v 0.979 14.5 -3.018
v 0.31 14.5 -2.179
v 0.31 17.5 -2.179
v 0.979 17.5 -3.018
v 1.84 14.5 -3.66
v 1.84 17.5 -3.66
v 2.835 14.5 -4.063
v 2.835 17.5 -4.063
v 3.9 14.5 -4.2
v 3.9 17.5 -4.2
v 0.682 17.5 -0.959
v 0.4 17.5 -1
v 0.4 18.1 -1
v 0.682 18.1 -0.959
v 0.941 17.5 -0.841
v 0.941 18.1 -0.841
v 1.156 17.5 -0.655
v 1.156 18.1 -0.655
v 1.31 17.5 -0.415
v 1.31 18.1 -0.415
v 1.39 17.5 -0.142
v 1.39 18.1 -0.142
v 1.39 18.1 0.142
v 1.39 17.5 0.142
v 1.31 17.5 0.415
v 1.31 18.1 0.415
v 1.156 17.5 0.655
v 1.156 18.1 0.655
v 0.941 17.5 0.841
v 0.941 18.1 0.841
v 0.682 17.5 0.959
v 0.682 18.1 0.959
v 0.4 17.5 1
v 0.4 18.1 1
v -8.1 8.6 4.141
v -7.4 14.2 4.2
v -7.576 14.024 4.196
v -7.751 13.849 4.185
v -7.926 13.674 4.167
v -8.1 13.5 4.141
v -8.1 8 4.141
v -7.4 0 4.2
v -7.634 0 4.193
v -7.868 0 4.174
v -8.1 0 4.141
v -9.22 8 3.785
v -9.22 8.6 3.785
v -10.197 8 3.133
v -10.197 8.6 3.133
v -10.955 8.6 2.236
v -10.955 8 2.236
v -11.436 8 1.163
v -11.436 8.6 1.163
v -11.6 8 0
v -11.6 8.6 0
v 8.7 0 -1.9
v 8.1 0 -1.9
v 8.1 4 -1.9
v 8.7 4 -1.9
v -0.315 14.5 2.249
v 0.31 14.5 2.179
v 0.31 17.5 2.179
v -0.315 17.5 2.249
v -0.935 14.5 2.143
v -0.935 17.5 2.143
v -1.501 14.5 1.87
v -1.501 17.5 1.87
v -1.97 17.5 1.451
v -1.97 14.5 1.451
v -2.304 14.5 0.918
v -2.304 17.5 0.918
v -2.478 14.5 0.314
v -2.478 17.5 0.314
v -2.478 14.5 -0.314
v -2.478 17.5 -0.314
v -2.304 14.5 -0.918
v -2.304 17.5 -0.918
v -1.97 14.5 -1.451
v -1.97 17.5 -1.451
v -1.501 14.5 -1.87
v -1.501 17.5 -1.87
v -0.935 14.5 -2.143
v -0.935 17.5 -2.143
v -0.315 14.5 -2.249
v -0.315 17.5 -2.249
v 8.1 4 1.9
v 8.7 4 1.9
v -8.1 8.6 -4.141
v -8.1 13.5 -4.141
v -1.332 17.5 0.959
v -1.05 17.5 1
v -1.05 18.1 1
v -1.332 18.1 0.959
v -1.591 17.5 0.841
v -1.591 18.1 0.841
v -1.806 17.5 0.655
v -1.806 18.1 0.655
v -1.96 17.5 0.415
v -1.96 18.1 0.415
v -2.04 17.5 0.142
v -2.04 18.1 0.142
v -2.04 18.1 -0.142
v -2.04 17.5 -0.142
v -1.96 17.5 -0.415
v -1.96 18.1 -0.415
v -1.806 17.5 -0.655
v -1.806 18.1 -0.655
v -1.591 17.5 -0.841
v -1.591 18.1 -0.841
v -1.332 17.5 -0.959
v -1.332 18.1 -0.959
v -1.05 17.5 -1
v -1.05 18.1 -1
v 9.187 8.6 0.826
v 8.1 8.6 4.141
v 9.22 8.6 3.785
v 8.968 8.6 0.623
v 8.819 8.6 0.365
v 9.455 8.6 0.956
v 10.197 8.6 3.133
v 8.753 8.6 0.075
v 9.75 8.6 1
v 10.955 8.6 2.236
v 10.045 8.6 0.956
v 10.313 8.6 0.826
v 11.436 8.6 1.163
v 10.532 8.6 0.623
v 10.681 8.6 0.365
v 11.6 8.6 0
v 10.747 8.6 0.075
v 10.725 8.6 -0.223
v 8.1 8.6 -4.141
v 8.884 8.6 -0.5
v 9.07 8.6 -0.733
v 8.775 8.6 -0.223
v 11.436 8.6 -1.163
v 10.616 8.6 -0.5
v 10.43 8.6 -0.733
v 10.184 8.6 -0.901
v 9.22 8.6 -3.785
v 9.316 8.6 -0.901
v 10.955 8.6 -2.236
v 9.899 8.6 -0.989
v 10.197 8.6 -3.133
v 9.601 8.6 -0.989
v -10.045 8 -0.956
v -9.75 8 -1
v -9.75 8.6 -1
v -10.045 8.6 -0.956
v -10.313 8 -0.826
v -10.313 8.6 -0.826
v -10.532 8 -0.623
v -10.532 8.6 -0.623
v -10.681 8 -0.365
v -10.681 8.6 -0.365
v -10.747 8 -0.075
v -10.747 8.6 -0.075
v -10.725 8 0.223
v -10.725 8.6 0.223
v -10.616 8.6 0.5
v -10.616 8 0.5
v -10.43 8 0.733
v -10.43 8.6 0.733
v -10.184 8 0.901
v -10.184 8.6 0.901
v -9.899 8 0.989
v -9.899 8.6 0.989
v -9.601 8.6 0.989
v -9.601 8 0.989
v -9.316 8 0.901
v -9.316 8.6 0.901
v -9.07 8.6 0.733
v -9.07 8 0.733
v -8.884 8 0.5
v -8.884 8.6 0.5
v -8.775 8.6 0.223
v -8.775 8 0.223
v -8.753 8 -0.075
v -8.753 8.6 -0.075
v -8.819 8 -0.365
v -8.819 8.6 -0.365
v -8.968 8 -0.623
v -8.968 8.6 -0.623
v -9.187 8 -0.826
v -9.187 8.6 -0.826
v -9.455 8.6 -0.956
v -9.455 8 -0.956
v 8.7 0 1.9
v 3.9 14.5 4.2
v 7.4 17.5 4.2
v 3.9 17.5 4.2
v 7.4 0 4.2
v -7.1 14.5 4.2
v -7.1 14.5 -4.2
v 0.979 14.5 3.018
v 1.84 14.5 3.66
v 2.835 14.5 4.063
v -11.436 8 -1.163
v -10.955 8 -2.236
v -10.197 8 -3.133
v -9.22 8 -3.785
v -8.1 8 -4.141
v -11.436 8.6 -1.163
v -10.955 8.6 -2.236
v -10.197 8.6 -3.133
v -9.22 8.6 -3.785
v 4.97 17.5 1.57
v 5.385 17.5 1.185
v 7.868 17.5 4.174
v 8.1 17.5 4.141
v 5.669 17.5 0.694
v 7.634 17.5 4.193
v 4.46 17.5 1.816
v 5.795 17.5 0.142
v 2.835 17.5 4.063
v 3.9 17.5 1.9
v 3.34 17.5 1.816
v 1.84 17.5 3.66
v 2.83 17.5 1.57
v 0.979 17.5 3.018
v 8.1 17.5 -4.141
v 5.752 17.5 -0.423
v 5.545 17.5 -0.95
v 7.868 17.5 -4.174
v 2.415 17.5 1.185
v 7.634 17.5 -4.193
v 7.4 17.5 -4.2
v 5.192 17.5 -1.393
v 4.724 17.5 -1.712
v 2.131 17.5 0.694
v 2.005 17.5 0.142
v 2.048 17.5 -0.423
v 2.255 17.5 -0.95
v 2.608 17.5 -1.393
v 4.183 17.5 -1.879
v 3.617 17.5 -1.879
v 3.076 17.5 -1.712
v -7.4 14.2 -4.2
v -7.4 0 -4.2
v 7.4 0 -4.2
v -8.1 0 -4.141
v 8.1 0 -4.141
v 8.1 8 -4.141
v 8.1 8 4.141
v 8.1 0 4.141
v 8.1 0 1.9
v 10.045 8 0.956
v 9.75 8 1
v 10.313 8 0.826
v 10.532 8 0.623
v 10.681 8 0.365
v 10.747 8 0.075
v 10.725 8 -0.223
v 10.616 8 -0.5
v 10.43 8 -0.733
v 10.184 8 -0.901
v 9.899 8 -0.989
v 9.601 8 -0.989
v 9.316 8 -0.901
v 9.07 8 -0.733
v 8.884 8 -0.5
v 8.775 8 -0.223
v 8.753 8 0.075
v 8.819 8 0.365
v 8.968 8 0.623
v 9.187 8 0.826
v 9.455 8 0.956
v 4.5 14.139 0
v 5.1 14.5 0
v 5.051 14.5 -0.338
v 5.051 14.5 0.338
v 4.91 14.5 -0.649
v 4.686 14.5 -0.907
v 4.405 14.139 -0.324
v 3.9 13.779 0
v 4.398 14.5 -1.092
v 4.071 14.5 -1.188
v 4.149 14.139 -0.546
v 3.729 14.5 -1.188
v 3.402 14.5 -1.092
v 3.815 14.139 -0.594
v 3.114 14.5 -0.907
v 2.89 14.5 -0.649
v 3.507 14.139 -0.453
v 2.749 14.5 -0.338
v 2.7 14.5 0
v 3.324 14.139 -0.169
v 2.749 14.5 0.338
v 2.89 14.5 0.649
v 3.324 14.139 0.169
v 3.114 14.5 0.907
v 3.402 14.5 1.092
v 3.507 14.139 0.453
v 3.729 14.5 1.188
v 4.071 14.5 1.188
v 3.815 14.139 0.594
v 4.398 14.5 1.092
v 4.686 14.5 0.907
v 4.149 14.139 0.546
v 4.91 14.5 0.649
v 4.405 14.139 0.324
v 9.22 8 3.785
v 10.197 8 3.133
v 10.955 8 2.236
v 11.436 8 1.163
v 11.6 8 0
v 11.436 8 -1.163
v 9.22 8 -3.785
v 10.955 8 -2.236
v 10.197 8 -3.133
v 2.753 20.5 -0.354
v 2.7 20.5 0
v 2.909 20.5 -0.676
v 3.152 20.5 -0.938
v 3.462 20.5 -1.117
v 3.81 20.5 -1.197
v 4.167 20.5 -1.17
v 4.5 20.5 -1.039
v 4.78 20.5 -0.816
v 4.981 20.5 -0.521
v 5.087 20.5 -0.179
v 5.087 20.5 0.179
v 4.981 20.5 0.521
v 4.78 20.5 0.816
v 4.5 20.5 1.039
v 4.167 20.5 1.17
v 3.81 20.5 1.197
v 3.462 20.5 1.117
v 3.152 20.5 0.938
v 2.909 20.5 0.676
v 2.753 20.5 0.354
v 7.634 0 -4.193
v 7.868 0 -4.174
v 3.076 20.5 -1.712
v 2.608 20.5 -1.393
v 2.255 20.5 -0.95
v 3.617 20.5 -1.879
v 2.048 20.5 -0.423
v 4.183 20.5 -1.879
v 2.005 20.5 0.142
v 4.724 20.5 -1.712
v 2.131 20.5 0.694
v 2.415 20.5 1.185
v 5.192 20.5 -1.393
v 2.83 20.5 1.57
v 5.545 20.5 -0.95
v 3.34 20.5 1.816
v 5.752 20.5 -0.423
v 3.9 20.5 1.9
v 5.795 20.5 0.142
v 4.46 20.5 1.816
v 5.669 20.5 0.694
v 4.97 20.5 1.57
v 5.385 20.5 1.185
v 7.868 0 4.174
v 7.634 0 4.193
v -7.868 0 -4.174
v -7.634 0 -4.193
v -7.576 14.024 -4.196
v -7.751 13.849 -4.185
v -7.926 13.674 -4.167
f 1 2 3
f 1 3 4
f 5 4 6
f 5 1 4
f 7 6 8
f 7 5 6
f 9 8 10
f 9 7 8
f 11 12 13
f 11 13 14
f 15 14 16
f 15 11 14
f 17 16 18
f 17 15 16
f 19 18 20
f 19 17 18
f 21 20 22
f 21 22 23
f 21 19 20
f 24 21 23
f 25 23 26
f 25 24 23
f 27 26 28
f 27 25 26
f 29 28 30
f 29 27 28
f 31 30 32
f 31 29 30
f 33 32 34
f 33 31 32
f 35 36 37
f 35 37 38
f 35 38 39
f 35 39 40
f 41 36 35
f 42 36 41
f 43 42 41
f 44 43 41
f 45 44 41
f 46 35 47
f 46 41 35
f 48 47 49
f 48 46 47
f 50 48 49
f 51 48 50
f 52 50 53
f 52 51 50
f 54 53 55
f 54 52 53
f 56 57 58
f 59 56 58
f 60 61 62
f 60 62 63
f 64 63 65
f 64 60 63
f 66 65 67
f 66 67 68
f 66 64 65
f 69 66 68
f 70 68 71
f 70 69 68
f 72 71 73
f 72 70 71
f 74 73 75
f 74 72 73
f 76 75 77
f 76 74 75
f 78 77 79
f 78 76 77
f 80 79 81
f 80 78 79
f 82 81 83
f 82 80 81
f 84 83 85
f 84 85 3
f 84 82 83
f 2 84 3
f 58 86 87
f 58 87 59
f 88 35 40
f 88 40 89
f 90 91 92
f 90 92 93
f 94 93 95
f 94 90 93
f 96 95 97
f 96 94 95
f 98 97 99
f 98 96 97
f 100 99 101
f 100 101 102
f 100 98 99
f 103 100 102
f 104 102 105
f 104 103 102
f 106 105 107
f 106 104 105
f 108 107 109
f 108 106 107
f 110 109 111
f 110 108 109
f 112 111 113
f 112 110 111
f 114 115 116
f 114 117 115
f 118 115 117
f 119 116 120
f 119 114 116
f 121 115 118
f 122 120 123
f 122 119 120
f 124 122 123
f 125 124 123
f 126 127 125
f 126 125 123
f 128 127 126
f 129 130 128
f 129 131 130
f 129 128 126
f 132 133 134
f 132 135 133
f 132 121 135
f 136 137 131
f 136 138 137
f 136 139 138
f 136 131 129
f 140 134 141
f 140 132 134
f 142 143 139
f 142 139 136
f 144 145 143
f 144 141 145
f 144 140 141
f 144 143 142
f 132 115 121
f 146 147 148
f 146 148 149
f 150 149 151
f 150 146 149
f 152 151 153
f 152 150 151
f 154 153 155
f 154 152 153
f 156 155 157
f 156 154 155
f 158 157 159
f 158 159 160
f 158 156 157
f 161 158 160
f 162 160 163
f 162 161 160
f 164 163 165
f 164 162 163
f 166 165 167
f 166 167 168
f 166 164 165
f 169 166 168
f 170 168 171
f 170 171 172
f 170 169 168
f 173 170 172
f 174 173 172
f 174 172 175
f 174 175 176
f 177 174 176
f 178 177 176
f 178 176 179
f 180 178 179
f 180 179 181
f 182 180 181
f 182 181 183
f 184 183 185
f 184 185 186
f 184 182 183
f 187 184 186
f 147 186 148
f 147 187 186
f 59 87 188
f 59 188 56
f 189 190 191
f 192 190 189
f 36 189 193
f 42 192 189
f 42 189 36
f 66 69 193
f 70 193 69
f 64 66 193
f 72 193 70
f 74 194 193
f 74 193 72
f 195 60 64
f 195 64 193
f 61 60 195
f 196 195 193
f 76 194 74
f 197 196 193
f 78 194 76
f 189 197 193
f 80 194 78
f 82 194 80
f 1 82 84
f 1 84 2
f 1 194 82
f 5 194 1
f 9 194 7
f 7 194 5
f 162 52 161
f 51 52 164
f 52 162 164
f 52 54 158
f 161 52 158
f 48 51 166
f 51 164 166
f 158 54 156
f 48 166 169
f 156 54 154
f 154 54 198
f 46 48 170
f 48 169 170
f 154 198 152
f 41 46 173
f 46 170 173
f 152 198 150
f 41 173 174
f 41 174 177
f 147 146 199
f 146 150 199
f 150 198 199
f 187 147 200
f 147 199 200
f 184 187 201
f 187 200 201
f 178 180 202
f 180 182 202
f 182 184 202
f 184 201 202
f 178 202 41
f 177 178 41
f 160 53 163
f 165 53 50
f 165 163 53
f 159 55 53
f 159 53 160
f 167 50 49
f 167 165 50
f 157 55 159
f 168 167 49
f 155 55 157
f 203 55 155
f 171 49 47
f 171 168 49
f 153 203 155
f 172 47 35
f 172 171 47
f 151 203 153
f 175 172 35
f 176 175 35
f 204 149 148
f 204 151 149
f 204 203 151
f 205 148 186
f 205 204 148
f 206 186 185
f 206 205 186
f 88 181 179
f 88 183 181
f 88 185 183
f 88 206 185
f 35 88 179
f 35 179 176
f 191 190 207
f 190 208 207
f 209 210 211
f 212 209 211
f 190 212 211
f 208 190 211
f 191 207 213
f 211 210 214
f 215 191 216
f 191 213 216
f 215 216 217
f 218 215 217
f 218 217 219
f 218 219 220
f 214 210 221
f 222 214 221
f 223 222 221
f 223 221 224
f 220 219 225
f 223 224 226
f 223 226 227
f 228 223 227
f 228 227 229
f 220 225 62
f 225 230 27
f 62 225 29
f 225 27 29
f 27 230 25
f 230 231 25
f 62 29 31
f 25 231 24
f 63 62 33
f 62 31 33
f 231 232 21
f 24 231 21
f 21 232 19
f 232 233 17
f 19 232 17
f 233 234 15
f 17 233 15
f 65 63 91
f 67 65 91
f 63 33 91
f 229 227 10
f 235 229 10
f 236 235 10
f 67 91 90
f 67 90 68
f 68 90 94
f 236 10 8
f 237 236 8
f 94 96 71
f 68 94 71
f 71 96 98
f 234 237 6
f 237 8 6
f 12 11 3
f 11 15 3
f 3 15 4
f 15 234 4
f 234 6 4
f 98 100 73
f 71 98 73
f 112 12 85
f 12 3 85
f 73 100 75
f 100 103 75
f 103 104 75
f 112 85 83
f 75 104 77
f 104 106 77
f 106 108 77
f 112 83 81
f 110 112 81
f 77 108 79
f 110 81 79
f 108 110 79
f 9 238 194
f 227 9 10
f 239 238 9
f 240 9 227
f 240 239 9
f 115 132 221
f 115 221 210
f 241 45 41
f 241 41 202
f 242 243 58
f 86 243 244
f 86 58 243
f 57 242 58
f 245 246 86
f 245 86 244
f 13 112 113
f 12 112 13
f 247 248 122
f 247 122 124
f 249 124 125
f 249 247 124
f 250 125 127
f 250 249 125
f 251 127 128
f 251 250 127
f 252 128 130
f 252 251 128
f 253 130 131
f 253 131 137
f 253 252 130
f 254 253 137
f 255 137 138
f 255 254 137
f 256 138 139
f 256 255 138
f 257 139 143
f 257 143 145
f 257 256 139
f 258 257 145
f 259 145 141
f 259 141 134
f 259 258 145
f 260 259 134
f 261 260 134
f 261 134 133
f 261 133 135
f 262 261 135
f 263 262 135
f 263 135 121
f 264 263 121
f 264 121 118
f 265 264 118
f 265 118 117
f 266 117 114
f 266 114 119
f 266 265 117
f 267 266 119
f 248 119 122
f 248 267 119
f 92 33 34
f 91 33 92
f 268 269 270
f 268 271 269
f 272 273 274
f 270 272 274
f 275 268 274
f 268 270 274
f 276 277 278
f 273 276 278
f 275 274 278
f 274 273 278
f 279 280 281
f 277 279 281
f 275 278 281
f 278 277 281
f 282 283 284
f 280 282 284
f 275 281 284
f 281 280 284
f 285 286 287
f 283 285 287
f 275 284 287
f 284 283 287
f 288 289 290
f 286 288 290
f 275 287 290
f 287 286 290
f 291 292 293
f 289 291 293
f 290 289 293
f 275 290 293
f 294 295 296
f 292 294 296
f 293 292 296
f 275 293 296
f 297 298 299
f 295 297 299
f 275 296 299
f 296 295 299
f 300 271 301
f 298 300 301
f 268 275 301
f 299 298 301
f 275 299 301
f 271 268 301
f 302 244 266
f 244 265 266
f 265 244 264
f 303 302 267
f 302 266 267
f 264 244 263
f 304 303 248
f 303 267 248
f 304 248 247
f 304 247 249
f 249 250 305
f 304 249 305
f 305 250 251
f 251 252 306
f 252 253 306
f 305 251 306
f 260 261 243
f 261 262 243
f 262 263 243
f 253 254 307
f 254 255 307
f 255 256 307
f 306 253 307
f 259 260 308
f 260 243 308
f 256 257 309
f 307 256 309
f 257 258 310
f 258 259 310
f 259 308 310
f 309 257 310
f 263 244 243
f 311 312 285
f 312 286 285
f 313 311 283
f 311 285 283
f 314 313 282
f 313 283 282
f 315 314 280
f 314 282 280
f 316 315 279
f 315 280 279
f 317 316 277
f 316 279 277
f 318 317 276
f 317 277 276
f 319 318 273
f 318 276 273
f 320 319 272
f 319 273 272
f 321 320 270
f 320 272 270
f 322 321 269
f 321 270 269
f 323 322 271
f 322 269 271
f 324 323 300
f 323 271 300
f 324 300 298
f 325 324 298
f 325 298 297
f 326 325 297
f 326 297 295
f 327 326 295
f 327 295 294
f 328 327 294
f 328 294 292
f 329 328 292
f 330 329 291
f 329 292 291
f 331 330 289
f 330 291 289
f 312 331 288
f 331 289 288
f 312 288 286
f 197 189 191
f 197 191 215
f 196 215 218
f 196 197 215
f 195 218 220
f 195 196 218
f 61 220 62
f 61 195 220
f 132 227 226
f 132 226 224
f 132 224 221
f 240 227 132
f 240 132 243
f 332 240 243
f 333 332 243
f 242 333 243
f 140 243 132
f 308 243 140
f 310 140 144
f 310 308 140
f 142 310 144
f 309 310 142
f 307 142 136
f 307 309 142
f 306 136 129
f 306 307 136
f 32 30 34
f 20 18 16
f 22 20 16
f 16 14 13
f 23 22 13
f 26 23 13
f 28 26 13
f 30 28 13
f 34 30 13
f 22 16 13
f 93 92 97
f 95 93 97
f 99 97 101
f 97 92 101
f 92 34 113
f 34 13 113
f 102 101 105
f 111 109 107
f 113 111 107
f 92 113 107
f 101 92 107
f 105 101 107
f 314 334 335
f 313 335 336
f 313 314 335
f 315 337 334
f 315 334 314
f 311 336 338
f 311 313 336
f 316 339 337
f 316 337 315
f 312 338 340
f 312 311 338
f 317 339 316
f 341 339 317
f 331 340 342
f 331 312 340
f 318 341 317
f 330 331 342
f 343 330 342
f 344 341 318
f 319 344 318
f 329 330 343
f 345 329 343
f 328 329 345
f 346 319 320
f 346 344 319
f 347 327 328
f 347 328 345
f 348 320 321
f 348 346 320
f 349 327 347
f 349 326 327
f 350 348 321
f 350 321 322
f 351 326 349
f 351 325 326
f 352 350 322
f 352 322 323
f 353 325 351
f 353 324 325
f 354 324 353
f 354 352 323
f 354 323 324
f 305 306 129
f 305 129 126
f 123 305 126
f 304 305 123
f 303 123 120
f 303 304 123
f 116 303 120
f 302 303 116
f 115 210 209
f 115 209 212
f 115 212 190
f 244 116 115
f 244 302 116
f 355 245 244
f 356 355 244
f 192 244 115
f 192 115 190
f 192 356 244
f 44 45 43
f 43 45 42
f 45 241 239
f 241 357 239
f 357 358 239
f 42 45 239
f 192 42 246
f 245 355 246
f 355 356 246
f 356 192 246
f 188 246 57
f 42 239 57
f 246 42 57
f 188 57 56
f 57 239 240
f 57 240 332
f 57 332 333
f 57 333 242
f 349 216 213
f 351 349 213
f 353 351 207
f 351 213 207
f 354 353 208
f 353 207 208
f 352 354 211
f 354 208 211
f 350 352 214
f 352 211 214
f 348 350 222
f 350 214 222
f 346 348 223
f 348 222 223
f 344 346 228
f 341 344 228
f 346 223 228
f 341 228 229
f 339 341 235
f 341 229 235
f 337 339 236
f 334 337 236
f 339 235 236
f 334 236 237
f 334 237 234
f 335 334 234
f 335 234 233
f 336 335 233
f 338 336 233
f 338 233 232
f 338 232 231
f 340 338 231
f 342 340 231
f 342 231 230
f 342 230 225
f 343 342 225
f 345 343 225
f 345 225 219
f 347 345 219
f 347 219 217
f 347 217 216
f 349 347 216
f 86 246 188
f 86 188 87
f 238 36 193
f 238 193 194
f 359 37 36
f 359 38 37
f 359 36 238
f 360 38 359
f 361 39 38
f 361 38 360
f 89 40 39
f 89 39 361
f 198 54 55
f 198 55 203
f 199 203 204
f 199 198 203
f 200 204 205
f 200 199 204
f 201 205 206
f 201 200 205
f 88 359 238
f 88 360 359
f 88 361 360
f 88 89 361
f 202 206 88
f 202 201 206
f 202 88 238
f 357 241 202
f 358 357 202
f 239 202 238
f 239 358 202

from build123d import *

# Parameters (mm, degrees)
SKETCH1_W                = 16.2
SKETCH1_H                = 8.4
BOSS_EXTRUDE1_DEPTH      = 14.5
SKETCH3_R                = 1.9
BOSS_EXTRUDE2_DEPTH      = 3
SKETCH3_3_R              = 1.9
BOSS_EXTRUDE3_DEPTH      = 6
SKETCH6_W                = 3.5
SKETCH6_H                = 8.4
SKETCH6_R                = 1
BOSS_EXTRUDE4_DEPTH      = 0.6
FILLET2_START            = -1
FILLET2_DEPTH            = 19
FILLET3_START            = -1
FILLET3_DEPTH            = 16
BOSS_EXTRUDE5_DEPTH      = 0.6
SKETCH8_W                = 3.8
SKETCH8_H                = 4
BOSS_EXTRUDE6_DEPTH      = 0.6
CHAMFER1_SIZE            = 1
M2_CLEARANCE_HOLE1_D     = 2.4
M2_CLEARANCE_HOLE1_DEPTH = 6
M2_CLEARANCE_HOLE1_TIP   = 0.721032743


with BuildPart() as part:
    # Sketch1 → Boss-Extrude1 (new body)
    with BuildSketch(Plane(origin=(0, 0, 0), x_dir=(1, 0, 0), z_dir=(0, 1, 0))):
        Rectangle(SKETCH1_W, SKETCH1_H)
    extrude(amount=BOSS_EXTRUDE1_DEPTH)

    # Sketch3 → Boss-Extrude2 (add)
    with BuildSketch(Plane(origin=(0, 14.5, 0), x_dir=(1, 0, 0), z_dir=(0, 1, 0))):
        with BuildLine():
            Line((3.9, 4.2), (8.1, 4.2))
            Line((8.1, 4.2), (8.1, -4.2))
            Line((8.1, -4.2), (3.9, -4.2))
            ThreePointArc((3.9, -4.2), (1.840026431, -3.660124164), (0.309638554, -2.179289951))
            ThreePointArc((0.309638554, -2.179289951), (-2.5, 0), (0.309638554, 2.179289951))
            ThreePointArc((0.309638554, 2.179289951), (1.840026431, 3.660124164), (3.9, 4.2))
        make_face()
        with Locations(Location((3.9, 0, 0), (0, 0, 270))):
            Circle(SKETCH3_R, mode=Mode.SUBTRACT)
    extrude(amount=BOSS_EXTRUDE2_DEPTH)

    # Sketch3<3> → Boss-Extrude3 (add)
    with BuildSketch(Plane(origin=(0, 14.5, 0), x_dir=(1, 0, 0), z_dir=(0, 1, 0))):
        with Locations(Location((3.9, 0, 0), (0, 0, 270))):
            Circle(SKETCH3_3_R)
    extrude(amount=BOSS_EXTRUDE3_DEPTH)

    # Sketch6 → Boss-Extrude4 (add)
    # profile 1 of 2: a face of its own
    with BuildSketch(Plane(origin=(0, 8, 0), x_dir=(1, 0, 0), z_dir=(0, 1, 0))):
        with Locations((9.85, 0)):
            Rectangle(SKETCH6_W, SKETCH6_H)
        with Locations(Location((9.75, 0, 0), (0, 0, 270))):
            Circle(SKETCH6_R, mode=Mode.SUBTRACT)
    # profile 2 of 2: a face of its own
    with BuildSketch(Plane(origin=(0, 8, 0), x_dir=(1, 0, 0), z_dir=(0, 1, 0))):
        with Locations((-9.85, 0)):
            Rectangle(SKETCH6_W, SKETCH6_H)
        with Locations(Location((-9.75, 0, 0), (0, 0, 90))):
            Circle(SKETCH6_R, mode=Mode.SUBTRACT)
    extrude(amount=BOSS_EXTRUDE4_DEPTH)

    # Fillet2: read off the stored shape, not the designer's step
    # Fillet2 outline → Fillet2 (cut)
    with BuildSketch(Plane(origin=(0, 0, 0), x_dir=(1, 0, 0), z_dir=(0, 1, 0)).offset(FILLET2_START)):
        with BuildLine():
            ThreePointArc((7.4, 4.2), (10.369848481, 2.969848481), (11.6, 0))
            Line((11.6, 0), (11.6, 4.2))
            Line((11.6, 4.2), (7.4, 4.2))
        make_face()
        with BuildLine():
            Line((11.6, -4.2), (11.6, 0))
            ThreePointArc((11.6, 0), (10.369848481, -2.969848481), (7.4, -4.2))
            Line((7.4, -4.2), (11.6, -4.2))
        make_face()
    extrude(amount=FILLET2_DEPTH, mode=Mode.SUBTRACT)

    # Fillet3: read off the stored shape, not the designer's step
    # Fillet3 outline → Fillet3 (cut)
    with BuildSketch(Plane(origin=(0, 0, 0), x_dir=(1, 0, 0), z_dir=(0, 1, 0)).offset(FILLET3_START)):
        with BuildLine():
            ThreePointArc((-7.4, -4.2), (-10.369848481, -2.969848481), (-11.6, 0))
            Line((-11.6, 0), (-11.6, -4.2))
            Line((-11.6, -4.2), (-7.4, -4.2))
        make_face()
        with BuildLine():
            Line((-11.6, 4.2), (-11.6, 0))
            ThreePointArc((-11.6, 0), (-10.369848481, 2.969848481), (-7.4, 4.2))
            Line((-7.4, 4.2), (-11.6, 4.2))
        make_face()
    extrude(amount=FILLET3_DEPTH, mode=Mode.SUBTRACT)

    # Sketch7 → Boss-Extrude5 (add)
    with BuildSketch(Plane(origin=(0, 17.5, 0), x_dir=(1, 0, 0), z_dir=(0, 1, 0))):
        with BuildLine():
            Line((-1.05, 1), (0.4, 1))
            ThreePointArc((0.4, 1), (1.4, 0), (0.4, -1))
            Line((0.4, -1), (-1.05, -1))
            ThreePointArc((-1.05, -1), (-2.05, 0), (-1.05, 1))
        make_face()
    extrude(amount=BOSS_EXTRUDE5_DEPTH)

    # Sketch8 → Boss-Extrude6 (add)
    with BuildSketch(Plane(origin=(8.1, 0, 0), x_dir=(0, 0, -1), z_dir=(1, 0, 0))):
        with Locations((0, 2)):
            Rectangle(SKETCH8_W, SKETCH8_H)
    extrude(amount=BOSS_EXTRUDE6_DEPTH)

    # Chamfer1
    chamfer1_edges = [part.edges().sort_by_distance(p)[0] for p in [
        (-8.1, 14.5, 0),
    ]]
    chamfer(chamfer1_edges, length=CHAMFER1_SIZE)

    # M2 Clearance Hole1
    with Locations(Plane(origin=(0, 20.5, 0), x_dir=(1, 0, 0), z_dir=(0, 1, 0))):
        with Locations((3.9, 0)):
            Hole(M2_CLEARANCE_HOLE1_D / 2, depth=M2_CLEARANCE_HOLE1_DEPTH)
            with Locations((0, 0, -(M2_CLEARANCE_HOLE1_DEPTH + M2_CLEARANCE_HOLE1_TIP / 2))):  # 118° drill point
                Cone(0, M2_CLEARANCE_HOLE1_D / 2, M2_CLEARANCE_HOLE1_TIP, mode=Mode.SUBTRACT)


solid = part.part
